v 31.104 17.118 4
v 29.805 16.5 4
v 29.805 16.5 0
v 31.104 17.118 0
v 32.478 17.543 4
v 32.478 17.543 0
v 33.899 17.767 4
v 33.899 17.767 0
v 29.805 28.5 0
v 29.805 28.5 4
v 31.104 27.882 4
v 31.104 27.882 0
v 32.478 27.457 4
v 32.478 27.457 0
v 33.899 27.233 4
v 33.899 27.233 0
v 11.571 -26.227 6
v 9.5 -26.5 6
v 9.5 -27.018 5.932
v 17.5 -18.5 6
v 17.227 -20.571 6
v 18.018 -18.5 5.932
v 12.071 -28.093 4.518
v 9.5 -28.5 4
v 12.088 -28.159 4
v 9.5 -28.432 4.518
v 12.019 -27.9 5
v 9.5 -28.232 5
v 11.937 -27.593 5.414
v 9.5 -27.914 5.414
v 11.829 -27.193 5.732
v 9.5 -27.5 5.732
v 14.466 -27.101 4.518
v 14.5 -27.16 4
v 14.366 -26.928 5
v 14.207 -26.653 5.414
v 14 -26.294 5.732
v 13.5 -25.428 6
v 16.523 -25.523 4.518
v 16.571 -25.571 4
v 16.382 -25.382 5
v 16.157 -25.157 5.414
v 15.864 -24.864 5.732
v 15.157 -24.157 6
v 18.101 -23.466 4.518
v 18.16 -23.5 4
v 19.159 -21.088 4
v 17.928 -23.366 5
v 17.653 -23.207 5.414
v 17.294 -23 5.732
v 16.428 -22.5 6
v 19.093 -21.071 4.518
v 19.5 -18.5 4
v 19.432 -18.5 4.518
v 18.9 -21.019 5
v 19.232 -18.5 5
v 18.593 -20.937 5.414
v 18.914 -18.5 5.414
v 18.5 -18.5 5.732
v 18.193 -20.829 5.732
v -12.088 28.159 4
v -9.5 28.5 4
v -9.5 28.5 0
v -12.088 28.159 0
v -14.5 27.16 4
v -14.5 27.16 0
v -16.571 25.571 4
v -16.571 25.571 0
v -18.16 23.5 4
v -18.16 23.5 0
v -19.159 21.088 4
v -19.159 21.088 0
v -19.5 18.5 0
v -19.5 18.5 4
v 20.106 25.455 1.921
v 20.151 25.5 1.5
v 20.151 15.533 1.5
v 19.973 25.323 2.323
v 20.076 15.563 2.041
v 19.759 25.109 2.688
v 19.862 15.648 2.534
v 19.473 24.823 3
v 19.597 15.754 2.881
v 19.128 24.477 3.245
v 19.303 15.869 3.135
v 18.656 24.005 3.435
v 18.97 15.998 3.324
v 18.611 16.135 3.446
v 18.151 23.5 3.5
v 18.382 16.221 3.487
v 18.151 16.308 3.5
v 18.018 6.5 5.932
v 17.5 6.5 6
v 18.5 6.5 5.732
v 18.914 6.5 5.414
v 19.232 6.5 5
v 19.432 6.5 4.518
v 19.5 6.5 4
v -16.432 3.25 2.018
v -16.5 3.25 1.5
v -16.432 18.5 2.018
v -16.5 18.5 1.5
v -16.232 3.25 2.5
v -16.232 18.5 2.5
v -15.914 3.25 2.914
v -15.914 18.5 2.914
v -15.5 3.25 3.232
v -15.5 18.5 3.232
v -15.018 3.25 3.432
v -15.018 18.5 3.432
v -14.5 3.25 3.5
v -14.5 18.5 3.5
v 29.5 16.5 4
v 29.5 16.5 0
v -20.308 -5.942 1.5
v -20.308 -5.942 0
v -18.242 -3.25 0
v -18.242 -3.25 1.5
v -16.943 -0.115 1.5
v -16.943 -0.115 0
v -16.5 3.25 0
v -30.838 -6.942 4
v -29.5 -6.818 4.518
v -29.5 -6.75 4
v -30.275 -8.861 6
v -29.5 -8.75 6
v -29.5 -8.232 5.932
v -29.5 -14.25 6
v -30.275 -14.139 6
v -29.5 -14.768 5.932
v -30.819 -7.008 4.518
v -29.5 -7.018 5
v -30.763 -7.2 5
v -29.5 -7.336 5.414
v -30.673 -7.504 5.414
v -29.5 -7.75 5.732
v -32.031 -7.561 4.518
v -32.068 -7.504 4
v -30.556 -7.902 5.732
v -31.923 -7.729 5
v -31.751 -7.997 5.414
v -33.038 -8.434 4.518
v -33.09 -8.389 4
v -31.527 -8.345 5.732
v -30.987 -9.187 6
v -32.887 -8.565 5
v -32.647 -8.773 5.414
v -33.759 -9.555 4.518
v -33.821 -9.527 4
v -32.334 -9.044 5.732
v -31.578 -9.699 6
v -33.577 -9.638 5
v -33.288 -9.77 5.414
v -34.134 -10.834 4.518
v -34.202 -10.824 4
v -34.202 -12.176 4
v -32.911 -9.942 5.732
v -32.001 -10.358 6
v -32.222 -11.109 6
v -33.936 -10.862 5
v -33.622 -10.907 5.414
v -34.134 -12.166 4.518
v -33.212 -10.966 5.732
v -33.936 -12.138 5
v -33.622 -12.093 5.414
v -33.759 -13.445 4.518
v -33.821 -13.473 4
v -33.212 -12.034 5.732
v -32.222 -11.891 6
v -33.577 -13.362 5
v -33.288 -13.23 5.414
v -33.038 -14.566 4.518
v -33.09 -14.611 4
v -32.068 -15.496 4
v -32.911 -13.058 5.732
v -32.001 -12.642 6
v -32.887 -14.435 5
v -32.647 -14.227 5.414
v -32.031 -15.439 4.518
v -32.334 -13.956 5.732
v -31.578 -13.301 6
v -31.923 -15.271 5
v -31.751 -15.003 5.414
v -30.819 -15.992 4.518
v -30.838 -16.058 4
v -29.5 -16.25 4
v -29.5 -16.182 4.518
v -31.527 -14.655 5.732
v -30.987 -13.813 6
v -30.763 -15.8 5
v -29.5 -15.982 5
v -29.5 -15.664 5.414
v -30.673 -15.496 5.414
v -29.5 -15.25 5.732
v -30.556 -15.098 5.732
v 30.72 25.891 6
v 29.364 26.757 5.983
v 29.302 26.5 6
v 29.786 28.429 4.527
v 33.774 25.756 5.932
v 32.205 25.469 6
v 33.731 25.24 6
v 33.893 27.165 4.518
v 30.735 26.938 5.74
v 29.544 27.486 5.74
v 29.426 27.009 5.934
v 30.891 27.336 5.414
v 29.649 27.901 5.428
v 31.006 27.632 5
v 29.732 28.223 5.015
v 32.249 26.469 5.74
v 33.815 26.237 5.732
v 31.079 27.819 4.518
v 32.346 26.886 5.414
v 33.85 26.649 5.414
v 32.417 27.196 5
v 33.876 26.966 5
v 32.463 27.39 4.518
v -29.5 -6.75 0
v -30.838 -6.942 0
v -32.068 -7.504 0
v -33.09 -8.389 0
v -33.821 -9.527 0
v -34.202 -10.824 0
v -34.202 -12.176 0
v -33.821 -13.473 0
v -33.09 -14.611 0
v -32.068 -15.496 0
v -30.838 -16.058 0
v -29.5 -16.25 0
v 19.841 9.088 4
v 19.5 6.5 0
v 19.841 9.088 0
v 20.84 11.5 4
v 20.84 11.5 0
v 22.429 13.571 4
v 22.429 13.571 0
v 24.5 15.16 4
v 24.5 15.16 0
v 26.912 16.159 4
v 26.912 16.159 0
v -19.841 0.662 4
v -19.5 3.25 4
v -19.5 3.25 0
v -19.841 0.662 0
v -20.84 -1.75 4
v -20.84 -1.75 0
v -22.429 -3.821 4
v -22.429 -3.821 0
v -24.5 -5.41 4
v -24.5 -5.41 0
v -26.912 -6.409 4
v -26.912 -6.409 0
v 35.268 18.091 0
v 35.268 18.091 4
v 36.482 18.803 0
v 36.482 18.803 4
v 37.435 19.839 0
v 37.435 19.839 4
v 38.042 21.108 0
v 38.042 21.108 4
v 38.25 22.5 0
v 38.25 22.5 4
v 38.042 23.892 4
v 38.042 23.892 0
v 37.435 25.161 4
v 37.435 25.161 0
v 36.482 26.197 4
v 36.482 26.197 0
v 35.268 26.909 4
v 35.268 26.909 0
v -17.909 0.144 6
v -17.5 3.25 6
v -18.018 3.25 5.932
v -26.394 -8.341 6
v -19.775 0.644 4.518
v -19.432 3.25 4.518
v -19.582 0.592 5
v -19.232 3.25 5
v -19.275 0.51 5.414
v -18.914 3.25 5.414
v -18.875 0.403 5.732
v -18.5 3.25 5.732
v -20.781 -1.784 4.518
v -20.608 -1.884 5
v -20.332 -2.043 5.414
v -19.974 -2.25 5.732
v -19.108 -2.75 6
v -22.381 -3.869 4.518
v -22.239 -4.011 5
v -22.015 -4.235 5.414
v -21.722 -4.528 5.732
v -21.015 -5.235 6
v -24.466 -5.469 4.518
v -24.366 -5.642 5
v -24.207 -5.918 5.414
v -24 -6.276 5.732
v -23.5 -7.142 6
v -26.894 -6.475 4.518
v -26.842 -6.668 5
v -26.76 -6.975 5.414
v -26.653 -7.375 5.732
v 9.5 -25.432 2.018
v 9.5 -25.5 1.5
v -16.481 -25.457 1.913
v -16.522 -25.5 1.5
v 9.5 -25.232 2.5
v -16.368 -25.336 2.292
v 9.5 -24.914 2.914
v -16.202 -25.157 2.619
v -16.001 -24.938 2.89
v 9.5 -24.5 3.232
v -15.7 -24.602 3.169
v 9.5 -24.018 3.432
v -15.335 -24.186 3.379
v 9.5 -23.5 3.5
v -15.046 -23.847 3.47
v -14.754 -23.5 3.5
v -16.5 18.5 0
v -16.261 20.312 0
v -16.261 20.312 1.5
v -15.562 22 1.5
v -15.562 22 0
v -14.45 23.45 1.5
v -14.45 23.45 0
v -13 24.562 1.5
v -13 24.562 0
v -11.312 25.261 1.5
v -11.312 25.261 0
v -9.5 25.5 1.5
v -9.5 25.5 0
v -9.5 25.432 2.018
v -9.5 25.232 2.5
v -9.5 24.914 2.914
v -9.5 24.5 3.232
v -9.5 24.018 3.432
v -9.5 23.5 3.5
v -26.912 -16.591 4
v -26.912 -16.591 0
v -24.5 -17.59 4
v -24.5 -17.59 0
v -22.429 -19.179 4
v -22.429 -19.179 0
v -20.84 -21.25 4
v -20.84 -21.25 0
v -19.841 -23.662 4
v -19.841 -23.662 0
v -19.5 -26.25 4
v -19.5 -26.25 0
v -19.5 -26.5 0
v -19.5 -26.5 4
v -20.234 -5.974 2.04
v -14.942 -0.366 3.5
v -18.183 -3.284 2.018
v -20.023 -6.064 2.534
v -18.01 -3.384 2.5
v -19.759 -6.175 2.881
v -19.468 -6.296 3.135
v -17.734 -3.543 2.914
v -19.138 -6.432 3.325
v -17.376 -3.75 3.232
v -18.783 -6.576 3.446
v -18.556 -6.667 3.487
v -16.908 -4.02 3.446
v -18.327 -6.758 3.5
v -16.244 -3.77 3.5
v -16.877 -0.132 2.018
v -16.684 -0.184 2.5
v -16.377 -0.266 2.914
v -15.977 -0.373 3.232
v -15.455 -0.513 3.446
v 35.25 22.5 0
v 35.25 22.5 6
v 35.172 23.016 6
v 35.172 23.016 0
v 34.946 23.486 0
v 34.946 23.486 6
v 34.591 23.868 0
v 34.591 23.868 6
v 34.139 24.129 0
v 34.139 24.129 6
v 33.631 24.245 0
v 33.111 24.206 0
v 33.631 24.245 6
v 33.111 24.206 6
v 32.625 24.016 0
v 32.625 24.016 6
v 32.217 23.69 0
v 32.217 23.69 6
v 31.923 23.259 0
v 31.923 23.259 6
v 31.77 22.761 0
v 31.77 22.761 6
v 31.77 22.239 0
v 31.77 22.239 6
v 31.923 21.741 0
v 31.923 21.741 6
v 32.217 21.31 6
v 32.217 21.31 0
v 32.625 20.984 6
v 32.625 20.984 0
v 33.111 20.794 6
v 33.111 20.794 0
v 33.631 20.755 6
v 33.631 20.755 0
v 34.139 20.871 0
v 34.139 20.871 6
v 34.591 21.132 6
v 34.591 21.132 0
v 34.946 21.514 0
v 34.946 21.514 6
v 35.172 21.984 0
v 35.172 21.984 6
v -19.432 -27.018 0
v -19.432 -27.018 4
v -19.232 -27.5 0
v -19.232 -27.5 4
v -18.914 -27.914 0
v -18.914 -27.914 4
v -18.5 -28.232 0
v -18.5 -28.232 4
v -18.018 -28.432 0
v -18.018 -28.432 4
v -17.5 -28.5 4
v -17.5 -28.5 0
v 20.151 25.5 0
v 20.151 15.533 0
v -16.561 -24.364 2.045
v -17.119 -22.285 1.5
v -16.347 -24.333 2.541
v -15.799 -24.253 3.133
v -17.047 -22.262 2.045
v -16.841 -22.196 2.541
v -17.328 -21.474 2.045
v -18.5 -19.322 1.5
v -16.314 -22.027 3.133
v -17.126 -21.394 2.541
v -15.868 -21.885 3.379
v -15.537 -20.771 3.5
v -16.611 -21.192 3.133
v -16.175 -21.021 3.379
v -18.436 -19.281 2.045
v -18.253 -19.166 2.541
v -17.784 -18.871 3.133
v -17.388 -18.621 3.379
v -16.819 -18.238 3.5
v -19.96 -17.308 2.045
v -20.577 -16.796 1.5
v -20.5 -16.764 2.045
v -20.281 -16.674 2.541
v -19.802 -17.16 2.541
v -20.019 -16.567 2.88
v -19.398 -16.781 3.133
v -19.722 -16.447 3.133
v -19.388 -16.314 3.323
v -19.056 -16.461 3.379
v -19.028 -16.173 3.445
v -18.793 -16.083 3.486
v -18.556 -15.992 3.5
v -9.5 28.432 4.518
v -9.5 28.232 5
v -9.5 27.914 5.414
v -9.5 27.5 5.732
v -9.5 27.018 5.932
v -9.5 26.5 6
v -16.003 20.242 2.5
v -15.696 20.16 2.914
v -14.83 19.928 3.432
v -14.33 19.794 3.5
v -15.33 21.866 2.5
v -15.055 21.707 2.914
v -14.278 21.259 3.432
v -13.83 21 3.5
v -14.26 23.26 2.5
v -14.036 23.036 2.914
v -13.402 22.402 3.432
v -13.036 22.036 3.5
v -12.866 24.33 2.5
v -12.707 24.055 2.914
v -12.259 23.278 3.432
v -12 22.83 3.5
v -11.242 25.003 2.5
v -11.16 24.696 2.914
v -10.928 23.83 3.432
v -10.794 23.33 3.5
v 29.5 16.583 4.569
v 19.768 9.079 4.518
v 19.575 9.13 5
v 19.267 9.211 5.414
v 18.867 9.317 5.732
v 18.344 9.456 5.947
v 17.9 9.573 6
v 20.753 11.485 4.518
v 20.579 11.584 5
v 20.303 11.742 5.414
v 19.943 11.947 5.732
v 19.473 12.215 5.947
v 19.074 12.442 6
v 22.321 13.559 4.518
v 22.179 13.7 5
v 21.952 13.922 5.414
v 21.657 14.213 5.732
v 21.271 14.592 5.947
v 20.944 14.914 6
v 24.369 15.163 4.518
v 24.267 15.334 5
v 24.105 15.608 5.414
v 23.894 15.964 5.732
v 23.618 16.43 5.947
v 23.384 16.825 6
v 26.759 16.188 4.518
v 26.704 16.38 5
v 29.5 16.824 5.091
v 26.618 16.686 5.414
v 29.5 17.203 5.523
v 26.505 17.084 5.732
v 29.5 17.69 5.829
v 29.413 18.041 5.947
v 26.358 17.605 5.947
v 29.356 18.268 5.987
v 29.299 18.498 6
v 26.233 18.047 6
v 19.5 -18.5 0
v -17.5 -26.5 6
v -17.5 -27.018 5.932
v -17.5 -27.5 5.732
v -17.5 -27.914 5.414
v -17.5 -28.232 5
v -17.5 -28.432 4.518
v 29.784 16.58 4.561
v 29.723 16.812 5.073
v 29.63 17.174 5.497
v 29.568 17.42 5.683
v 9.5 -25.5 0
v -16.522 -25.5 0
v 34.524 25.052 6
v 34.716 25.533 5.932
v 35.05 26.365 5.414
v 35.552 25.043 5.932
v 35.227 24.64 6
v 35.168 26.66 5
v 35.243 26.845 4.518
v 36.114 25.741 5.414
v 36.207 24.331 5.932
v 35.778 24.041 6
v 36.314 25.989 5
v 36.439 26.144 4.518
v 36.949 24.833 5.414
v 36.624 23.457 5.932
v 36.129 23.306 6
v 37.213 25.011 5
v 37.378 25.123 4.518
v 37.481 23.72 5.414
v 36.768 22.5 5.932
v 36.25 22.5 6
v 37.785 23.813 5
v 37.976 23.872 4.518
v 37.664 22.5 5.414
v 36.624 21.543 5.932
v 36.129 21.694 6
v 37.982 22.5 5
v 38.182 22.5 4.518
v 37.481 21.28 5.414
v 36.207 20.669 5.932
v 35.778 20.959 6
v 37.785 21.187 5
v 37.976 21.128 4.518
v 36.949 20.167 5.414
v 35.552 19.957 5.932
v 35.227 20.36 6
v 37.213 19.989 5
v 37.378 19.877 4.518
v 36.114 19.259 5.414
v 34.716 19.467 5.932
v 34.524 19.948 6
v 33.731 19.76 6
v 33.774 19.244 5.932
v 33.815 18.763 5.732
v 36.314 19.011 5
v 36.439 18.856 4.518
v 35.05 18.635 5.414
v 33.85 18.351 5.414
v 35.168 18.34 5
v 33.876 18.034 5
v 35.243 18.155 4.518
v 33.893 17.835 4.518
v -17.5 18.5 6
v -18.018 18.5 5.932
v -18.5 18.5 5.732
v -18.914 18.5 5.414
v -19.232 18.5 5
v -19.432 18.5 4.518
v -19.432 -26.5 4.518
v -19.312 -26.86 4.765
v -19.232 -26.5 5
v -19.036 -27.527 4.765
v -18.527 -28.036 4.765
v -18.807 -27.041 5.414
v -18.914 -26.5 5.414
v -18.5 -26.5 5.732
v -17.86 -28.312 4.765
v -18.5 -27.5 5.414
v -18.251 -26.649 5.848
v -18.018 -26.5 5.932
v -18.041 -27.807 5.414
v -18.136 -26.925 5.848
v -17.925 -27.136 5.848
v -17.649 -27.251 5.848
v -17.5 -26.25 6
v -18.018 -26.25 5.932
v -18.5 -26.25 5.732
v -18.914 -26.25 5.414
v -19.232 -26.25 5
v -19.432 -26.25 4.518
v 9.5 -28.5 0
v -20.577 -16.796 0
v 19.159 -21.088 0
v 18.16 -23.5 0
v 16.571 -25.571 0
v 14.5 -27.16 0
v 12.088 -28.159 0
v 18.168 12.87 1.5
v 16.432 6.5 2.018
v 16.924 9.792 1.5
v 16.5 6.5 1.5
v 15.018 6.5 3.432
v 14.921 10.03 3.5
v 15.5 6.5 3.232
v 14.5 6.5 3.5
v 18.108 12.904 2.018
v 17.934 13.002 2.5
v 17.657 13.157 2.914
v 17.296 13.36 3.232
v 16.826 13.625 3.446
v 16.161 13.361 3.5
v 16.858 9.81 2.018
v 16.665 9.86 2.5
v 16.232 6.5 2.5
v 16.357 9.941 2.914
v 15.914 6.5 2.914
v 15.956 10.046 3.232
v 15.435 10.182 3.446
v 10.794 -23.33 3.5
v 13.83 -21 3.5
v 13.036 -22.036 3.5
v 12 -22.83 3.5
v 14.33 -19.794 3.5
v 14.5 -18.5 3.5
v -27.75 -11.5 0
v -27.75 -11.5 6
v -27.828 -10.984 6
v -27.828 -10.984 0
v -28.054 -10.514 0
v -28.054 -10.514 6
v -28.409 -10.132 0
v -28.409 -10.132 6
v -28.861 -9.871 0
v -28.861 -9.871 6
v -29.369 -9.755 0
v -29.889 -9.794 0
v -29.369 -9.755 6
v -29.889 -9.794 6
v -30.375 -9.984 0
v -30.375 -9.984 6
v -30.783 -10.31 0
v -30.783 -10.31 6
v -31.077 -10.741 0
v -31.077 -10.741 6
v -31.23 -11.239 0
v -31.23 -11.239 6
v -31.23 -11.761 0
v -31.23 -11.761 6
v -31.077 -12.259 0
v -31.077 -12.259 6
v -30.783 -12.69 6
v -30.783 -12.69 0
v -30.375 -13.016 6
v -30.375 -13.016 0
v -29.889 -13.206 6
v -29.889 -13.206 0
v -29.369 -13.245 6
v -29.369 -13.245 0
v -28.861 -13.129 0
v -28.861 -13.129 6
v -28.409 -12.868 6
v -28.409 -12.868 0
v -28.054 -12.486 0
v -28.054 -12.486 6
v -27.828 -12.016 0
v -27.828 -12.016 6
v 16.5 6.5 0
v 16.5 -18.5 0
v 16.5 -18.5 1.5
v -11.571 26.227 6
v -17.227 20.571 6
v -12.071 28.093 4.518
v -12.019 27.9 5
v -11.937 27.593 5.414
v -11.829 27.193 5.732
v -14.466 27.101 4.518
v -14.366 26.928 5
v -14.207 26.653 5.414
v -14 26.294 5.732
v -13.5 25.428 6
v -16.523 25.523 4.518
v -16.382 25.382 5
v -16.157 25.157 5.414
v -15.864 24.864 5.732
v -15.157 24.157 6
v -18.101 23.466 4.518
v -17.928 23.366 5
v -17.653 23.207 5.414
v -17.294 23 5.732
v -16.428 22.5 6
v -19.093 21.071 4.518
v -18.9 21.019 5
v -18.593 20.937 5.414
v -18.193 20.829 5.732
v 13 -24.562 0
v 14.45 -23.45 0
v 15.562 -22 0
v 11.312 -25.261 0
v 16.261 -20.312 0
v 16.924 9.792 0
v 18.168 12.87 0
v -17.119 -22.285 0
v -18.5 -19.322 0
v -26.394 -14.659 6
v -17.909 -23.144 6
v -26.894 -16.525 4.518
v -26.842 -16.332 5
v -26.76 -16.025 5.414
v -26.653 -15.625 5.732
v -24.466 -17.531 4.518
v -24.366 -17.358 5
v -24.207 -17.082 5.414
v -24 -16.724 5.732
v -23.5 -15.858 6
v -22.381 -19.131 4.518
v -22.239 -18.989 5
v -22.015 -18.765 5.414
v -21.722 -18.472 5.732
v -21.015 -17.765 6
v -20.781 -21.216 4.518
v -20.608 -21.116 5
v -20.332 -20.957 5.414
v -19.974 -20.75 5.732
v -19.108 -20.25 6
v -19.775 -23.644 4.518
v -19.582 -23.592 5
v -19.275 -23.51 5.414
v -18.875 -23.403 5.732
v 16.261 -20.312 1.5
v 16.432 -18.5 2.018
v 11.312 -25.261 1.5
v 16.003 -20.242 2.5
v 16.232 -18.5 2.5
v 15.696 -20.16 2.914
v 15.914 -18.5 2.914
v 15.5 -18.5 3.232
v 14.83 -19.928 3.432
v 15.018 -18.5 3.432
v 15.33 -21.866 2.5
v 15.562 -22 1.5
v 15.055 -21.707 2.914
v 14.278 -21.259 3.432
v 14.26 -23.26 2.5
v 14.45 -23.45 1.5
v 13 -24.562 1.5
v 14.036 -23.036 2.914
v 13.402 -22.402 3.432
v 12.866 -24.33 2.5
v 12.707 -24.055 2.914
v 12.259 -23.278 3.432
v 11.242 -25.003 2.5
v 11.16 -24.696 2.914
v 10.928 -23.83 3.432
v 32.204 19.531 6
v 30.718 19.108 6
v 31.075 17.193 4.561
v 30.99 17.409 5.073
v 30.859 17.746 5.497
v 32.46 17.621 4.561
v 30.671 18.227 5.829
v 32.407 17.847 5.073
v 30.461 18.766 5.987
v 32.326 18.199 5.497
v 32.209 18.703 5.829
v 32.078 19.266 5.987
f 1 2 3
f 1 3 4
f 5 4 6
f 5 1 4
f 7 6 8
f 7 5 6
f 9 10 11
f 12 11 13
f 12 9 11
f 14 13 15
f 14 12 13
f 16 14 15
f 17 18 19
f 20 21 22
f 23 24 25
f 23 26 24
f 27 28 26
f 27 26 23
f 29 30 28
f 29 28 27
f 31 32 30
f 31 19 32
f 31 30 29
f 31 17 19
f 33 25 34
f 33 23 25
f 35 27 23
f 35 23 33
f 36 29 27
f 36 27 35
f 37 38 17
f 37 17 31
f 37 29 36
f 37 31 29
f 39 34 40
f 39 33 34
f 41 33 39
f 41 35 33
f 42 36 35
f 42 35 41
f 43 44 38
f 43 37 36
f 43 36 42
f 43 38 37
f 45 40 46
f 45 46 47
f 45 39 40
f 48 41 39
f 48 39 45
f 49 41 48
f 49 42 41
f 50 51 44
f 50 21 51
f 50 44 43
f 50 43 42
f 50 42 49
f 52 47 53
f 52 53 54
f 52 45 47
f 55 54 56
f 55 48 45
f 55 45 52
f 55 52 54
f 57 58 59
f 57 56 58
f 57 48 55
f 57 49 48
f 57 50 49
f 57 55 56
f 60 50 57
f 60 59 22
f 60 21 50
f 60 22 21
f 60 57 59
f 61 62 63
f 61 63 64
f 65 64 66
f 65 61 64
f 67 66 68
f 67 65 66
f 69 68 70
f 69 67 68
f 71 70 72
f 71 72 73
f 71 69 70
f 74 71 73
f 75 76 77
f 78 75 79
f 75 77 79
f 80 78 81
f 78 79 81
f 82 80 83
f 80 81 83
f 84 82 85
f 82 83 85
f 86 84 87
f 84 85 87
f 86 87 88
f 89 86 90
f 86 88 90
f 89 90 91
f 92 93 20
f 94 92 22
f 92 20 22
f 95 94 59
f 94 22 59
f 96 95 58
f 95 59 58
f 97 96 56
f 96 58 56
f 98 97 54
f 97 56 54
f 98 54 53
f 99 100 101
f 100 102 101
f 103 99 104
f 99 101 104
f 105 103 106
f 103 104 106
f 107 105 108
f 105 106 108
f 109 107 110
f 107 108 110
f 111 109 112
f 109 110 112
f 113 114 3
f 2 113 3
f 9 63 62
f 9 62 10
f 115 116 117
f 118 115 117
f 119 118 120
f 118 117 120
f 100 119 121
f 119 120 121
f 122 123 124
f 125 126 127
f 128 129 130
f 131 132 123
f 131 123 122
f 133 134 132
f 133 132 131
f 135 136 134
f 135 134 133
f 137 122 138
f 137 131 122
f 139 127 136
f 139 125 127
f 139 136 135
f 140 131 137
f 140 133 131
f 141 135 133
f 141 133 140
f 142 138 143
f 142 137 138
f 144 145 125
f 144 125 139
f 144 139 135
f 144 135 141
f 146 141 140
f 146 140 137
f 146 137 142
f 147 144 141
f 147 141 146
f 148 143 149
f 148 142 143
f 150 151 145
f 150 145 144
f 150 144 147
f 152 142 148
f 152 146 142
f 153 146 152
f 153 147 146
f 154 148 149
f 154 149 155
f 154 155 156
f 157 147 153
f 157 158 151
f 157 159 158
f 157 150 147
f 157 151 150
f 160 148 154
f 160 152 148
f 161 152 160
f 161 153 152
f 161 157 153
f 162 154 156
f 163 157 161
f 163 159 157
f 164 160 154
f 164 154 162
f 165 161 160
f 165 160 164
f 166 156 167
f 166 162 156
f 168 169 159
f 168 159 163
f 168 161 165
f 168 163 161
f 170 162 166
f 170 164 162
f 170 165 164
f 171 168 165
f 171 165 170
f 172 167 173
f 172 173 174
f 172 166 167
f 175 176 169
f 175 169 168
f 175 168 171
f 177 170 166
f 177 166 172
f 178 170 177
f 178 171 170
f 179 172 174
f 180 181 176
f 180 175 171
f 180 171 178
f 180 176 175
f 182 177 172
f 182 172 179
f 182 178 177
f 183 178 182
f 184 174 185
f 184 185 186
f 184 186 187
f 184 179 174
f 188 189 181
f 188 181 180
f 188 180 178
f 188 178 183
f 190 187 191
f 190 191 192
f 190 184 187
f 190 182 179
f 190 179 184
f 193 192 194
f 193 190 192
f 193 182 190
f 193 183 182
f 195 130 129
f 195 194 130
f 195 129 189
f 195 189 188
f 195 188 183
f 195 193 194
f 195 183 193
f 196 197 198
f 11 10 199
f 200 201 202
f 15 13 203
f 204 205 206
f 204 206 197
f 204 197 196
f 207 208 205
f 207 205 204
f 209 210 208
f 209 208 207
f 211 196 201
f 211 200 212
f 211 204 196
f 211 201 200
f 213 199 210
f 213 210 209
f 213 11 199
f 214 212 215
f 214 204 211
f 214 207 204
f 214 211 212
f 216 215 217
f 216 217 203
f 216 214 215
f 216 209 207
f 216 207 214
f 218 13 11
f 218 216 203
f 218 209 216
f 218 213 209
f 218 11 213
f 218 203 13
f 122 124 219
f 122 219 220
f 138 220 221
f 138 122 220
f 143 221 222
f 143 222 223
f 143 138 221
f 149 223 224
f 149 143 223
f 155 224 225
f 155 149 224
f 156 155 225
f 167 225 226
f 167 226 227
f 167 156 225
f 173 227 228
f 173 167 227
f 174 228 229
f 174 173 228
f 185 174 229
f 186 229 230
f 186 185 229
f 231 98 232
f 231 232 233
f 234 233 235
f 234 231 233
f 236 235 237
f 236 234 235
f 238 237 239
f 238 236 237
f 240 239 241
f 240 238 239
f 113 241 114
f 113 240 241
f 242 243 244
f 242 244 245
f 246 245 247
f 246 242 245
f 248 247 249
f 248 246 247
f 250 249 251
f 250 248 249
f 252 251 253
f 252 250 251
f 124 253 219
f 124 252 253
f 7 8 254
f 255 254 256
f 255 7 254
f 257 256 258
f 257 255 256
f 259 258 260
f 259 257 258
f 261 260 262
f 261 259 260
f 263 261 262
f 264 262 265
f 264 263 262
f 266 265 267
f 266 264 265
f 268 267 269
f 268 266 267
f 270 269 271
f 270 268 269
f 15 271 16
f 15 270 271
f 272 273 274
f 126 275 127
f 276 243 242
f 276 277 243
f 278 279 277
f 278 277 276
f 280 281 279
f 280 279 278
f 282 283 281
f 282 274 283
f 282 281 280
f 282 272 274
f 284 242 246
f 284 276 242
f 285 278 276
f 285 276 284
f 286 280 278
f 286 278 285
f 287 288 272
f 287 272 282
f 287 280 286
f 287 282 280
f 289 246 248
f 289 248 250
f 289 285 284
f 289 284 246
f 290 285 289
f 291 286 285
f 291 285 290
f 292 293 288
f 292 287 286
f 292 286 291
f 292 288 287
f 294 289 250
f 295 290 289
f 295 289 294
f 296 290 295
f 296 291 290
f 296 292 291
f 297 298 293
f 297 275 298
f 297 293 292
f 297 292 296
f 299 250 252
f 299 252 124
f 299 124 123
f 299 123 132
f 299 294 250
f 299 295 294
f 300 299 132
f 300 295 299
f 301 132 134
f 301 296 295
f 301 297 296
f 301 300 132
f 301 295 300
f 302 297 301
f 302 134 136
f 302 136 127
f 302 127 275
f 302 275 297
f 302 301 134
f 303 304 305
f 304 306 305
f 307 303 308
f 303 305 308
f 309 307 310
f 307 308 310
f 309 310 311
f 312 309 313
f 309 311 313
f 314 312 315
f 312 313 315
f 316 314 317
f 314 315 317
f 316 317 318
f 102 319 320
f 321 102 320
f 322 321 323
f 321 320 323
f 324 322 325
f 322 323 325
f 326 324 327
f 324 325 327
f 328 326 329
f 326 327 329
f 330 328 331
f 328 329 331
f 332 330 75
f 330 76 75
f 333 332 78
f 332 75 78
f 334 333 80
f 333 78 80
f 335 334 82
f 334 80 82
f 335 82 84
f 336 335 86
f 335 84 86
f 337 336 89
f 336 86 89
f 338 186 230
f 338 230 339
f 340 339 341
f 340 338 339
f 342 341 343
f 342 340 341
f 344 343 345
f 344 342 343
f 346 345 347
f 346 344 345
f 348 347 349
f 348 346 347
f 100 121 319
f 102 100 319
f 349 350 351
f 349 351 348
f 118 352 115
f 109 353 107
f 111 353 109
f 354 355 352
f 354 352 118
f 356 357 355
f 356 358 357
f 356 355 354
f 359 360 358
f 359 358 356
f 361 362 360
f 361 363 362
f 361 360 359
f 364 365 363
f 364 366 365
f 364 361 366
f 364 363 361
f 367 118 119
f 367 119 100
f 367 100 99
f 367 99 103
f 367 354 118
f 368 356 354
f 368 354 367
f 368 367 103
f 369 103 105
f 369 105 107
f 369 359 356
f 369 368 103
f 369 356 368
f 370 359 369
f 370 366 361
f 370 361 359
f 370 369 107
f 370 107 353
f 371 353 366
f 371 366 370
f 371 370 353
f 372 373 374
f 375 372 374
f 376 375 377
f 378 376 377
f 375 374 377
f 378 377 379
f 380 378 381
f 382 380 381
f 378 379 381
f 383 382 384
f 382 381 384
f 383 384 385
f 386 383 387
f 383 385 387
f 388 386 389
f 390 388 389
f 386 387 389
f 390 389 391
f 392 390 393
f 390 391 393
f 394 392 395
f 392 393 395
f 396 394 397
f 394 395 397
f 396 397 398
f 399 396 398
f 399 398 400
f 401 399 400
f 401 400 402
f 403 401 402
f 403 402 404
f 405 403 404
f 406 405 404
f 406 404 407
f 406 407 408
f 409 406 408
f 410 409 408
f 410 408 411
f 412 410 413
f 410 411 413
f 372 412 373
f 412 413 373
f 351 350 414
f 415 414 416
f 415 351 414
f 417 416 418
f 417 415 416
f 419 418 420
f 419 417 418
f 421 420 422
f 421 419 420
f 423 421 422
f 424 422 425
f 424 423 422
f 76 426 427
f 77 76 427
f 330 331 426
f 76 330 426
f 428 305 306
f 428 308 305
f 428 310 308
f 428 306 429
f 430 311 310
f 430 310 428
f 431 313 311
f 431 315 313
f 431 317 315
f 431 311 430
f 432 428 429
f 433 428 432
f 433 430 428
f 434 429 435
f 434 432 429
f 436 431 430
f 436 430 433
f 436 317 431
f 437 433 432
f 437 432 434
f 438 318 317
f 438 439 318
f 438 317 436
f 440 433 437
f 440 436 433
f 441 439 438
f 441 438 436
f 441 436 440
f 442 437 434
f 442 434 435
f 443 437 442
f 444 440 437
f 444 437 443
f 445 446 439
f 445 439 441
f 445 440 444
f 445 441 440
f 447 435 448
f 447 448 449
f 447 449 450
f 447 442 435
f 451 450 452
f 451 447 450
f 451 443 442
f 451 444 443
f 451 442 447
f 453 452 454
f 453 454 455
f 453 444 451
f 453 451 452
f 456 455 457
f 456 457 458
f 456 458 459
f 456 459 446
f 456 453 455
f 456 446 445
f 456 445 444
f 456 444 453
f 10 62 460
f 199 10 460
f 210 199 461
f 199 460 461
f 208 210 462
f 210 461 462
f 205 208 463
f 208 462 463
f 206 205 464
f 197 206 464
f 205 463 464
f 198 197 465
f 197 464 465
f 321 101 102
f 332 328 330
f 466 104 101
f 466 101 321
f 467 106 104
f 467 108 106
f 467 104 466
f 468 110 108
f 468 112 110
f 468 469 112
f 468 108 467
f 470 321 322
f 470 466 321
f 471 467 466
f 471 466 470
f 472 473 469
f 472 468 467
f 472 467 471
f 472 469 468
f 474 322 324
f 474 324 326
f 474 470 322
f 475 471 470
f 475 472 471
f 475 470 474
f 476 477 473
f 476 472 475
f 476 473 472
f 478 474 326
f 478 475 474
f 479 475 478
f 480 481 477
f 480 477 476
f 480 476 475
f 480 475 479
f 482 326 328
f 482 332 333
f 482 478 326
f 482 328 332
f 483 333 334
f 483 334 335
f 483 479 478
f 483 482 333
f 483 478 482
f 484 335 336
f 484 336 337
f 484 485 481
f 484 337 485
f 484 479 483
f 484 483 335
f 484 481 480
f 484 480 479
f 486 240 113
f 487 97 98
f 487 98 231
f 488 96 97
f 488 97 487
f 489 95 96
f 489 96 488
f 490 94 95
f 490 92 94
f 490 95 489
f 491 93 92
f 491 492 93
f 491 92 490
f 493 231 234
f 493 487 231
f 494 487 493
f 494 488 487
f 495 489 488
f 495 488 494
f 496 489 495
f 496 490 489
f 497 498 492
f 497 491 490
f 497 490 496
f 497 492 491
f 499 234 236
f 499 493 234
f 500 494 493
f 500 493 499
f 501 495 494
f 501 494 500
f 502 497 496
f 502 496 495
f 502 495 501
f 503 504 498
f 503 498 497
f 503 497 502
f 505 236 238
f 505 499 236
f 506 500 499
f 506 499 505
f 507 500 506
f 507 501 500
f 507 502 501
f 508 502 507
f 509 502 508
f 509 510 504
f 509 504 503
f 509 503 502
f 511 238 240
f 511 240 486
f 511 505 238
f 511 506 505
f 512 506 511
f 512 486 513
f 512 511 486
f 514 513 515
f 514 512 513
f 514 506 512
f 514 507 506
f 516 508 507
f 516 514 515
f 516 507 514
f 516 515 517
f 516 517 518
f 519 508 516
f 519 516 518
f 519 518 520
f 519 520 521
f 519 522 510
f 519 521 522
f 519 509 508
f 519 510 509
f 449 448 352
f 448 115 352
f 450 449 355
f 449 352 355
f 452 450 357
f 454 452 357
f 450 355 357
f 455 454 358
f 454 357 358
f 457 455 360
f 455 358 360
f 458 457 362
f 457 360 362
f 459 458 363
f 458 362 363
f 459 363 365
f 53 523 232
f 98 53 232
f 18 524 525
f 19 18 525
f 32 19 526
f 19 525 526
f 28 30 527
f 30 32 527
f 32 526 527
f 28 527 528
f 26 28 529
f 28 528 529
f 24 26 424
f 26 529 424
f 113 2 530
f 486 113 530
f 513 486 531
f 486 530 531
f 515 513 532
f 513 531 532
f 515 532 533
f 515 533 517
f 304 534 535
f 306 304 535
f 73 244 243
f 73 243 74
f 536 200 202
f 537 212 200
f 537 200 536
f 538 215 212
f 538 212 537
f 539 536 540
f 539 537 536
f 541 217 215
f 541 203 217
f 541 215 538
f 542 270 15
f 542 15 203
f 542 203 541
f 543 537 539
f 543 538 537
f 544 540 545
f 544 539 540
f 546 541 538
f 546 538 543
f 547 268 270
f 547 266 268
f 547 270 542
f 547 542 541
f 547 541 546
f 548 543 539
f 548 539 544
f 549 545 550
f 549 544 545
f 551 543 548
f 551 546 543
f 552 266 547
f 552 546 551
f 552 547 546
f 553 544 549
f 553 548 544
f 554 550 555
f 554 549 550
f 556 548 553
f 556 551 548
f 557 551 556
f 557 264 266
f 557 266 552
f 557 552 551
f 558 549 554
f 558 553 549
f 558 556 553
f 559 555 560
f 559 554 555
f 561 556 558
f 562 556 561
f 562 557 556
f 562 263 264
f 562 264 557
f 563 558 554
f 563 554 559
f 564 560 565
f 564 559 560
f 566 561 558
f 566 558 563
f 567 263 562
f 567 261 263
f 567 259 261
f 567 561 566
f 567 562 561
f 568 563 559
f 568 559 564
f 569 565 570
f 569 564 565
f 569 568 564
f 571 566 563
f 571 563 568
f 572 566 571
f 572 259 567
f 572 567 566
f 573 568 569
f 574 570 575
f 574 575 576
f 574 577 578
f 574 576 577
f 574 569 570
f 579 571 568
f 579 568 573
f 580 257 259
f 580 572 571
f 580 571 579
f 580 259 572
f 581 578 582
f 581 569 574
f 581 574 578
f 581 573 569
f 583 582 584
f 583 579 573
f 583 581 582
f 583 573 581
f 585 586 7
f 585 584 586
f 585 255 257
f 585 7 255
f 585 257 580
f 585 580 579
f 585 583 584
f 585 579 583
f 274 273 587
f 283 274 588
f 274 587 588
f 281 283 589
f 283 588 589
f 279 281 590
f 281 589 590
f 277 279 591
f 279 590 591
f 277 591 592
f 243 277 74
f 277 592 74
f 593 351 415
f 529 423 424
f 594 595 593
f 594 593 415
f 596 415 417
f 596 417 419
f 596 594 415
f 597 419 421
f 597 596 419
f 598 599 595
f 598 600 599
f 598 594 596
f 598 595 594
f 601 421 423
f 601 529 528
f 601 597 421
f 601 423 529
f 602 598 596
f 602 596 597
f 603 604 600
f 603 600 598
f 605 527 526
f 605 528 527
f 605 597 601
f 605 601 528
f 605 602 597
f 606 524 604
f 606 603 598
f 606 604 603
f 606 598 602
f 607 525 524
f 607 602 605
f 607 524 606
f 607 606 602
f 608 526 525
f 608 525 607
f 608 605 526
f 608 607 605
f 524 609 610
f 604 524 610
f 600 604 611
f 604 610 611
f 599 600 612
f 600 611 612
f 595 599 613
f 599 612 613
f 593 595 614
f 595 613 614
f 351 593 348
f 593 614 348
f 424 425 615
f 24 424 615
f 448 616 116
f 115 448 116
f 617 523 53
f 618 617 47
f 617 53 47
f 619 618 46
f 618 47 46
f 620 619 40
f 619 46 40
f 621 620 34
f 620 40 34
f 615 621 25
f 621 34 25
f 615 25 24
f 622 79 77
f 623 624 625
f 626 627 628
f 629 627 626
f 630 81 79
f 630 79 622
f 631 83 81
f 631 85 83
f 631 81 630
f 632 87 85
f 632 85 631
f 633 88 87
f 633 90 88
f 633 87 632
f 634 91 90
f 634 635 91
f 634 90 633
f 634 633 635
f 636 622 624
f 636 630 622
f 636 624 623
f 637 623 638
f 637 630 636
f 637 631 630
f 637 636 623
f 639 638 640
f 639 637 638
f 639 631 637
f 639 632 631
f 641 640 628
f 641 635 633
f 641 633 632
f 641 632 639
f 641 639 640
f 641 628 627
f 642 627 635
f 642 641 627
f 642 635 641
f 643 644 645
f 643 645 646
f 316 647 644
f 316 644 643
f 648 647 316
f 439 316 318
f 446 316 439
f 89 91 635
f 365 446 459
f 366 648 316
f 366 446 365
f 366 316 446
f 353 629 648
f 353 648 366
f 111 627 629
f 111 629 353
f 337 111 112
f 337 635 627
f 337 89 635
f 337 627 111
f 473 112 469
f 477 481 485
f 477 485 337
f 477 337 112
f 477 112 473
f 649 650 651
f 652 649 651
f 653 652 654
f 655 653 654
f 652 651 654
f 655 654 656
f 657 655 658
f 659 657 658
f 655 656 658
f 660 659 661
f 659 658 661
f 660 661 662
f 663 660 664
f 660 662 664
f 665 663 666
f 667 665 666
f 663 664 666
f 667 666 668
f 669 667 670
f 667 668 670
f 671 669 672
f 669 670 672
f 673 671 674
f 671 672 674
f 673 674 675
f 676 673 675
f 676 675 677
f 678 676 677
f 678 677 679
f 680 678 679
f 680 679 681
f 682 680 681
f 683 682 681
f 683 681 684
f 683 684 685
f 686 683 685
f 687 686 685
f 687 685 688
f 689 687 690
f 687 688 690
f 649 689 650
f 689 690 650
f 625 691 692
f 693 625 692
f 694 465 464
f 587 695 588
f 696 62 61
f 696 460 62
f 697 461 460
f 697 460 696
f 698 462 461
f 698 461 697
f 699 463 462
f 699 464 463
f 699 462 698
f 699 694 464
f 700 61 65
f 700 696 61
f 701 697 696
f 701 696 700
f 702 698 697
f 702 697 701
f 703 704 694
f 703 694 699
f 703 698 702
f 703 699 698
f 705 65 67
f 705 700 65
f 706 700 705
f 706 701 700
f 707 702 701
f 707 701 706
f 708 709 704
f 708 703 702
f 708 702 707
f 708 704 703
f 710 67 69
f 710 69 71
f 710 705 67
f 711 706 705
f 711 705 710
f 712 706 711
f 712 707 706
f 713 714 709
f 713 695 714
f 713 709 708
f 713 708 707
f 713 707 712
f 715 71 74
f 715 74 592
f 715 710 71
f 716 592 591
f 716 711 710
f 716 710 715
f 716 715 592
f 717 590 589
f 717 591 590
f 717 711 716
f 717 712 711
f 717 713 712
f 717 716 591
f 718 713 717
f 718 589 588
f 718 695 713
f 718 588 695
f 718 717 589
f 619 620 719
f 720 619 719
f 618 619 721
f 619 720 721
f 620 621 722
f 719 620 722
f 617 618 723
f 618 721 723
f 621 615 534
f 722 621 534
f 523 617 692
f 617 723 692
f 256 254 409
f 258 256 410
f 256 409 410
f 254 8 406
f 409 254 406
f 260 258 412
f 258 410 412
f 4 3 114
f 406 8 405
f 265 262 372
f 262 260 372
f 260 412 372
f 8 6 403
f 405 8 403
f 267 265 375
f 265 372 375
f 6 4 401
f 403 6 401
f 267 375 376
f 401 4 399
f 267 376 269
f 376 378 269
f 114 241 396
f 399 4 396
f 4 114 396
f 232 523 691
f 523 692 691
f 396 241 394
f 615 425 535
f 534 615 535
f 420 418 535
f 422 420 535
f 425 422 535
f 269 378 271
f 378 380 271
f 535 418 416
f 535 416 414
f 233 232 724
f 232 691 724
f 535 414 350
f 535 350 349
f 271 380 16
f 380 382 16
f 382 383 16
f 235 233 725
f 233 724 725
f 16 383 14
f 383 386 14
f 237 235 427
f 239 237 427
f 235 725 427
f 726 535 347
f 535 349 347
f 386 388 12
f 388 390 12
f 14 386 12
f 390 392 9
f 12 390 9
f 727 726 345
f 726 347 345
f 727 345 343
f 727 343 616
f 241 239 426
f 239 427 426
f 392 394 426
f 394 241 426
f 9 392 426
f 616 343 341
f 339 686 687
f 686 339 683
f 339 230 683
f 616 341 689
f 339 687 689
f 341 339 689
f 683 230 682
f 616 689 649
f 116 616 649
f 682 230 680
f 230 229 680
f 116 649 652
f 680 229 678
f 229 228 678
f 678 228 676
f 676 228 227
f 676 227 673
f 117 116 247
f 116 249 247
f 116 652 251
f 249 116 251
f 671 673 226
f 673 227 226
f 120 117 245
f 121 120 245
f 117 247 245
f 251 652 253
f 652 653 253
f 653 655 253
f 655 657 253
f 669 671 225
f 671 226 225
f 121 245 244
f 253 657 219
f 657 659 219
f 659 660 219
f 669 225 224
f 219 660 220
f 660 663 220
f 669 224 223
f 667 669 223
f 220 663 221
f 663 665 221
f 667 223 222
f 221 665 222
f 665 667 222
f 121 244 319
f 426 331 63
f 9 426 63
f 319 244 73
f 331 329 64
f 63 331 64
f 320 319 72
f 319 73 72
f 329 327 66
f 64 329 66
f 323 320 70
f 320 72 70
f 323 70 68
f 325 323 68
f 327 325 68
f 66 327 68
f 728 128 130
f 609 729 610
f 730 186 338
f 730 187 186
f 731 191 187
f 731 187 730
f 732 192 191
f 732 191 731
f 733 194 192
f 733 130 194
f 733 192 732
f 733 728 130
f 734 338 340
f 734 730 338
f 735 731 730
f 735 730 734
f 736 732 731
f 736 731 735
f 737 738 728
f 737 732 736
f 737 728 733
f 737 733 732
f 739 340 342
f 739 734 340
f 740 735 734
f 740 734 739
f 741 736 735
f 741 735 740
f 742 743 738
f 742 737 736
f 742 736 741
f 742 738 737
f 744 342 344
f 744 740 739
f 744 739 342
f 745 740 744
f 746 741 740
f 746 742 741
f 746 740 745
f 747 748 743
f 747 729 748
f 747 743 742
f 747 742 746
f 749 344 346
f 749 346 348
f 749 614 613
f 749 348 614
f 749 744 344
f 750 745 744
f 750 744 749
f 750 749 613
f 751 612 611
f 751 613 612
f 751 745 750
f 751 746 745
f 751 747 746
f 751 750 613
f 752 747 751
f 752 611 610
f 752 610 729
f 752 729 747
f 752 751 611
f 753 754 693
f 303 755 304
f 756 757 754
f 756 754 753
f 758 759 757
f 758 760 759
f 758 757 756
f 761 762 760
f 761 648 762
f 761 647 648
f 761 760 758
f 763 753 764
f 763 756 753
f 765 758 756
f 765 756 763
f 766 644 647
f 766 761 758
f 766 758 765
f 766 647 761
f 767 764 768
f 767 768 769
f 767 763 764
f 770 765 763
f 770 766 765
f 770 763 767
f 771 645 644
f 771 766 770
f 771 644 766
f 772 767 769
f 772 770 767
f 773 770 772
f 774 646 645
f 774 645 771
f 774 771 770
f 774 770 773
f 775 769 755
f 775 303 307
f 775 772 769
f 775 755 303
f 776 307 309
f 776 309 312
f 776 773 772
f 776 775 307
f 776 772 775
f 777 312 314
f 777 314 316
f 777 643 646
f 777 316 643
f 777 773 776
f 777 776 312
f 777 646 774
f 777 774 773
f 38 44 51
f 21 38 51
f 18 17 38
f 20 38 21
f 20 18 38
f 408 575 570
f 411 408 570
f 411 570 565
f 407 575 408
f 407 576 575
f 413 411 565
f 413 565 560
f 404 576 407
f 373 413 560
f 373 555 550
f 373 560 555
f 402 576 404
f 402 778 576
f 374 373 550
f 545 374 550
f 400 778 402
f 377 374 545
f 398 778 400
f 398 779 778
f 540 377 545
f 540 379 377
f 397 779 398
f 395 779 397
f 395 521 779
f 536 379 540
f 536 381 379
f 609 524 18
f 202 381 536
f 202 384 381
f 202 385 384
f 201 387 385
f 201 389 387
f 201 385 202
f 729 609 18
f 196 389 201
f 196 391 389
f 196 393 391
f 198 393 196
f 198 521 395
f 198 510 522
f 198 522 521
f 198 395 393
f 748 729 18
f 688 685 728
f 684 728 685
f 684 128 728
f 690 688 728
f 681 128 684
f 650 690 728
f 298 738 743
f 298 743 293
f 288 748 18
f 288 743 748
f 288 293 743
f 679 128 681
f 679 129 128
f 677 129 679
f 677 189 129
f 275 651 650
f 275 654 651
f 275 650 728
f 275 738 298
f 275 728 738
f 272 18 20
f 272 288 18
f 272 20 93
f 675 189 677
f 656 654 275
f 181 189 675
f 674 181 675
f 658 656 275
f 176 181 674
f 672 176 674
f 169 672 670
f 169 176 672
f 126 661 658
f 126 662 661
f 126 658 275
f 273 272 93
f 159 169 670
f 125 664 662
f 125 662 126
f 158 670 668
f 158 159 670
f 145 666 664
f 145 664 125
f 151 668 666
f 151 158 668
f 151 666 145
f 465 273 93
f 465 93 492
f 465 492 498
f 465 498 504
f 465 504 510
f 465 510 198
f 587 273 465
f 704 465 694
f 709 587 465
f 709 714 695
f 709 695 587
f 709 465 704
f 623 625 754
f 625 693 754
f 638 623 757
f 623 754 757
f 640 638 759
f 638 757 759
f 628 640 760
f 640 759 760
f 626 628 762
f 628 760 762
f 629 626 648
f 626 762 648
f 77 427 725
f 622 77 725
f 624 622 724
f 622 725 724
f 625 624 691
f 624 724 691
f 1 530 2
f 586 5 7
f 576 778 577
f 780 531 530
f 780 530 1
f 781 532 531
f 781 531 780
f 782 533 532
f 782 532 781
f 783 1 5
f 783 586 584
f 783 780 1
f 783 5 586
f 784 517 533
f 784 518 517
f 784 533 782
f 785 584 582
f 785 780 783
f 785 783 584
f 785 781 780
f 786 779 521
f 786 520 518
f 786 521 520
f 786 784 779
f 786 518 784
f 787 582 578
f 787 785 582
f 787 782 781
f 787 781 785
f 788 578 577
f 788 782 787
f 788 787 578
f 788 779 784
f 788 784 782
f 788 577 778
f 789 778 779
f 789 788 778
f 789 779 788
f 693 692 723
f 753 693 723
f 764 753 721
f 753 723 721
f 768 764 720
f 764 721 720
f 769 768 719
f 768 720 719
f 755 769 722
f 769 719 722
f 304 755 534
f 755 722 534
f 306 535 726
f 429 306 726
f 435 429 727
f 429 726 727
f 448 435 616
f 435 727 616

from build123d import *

# Parameters (mm, degrees)
SKETCH1_W           = 39
SKETCH1_H           = 57
BOSS_EXTRUDE1_DEPTH = 6
SKETCH2_R           = 4.75
SKETCH2_R_2         = 1.75
BOSS_EXTRUDE2_DEPTH = 6
FILLET4_R           = 10
SKETCH4_W           = 10.304705379
SKETCH4_H           = 12
BOSS_EXTRUDE3_DEPTH = 6
FILLET5_R           = 10
CUT_EXTRUDE2_DEPTH  = 3.5
FILLET7_R           = 2
FILLET8_R           = 2
FILLET9_R           = 2


with BuildPart() as part:
    # Sketch1 → Boss-Extrude1 (new body)
    with BuildSketch(Plane.XY):
        Rectangle(SKETCH1_W, SKETCH1_H)
    extrude(amount=BOSS_EXTRUDE1_DEPTH)

    # Sketch2 → Boss-Extrude2 (add)
    # profile 1 of 4: a face of its own
    with BuildSketch(Plane.XY.offset(6)):
        with BuildLine():
            ThreePointArc((33.5, 17.75), (28.75, 22.5), (33.5, 27.25))
            Line((33.5, 27.25), (19.5, 27.25))
            Line((19.5, 27.25), (19.5, 17.75))
            Line((19.5, 17.75), (33.5, 17.75))
        make_face()
    # profile 2 of 4: a face of its own
    with BuildSketch(Plane.XY.offset(6)):
        with BuildLine():
            Line((-19.5, -6.75), (-29.5, -6.75))
            ThreePointArc((-29.5, -6.75), (-26.141242789, -8.141242789), (-24.75, -11.5))
            ThreePointArc((-24.75, -11.5), (-26.141242789, -14.858757211), (-29.5, -16.25))
            Line((-29.5, -16.25), (-19.5, -16.25))
            Line((-19.5, -16.25), (-19.5, -6.75))
        make_face()
    # profile 3 of 4: a face of its own
    with BuildSketch(Plane.XY.offset(6)):
        with Locations((-29.5, -11.5)):
            Circle(SKETCH2_R)
        with Locations((-29.5, -11.5)):
            Circle(SKETCH2_R_2, mode=Mode.SUBTRACT)
    # profile 4 of 4: a face of its own
    with BuildSketch(Plane.XY.offset(6)):
        with Locations((33.5, 22.5)):
            Circle(SKETCH2_R)
        with Locations((33.5, 22.5)):
            Circle(SKETCH2_R_2, mode=Mode.SUBTRACT)
    extrude(amount=-BOSS_EXTRUDE2_DEPTH)

    # Fillet4
    fillet4_edges = [part.edges().sort_by_distance(p)[0] for p in [
        (-19.5, 28.5, 3),
        (19.5, -28.5, 3),
    ]]
    fillet(fillet4_edges, radius=FILLET4_R)

    # Sketch4 → Boss-Extrude3 (add)
    with BuildSketch(Plane.XY.offset(6)):
        with Locations((24.652352689, 22.5)):
            Rectangle(SKETCH4_W, SKETCH4_H)
    extrude(amount=-BOSS_EXTRUDE3_DEPTH)

    # Fillet5
    # the kernel refuses this fillet: 10 mm, written as the material it adds along each edge
    with BuildSketch(Plane(origin=(29.804705379, 17.75, 6), x_dir=(0, -1, 0), z_dir=(0, 0, -1))) as fillet5_piece_1:
        with BuildLine():
            CenterArc((9.947871925, -4.934270359), FILLET5_R, 150.433919307, 24.747651836)
            Line((-0.016787007, -4.094286808), (-1.0132529, -4.010288453))
            ThreePointArc((-1.0132529, -4.010288453), (-1, -3.695294621), (-1, 0))
            Line((-1, 0), (0, 1))
            ThreePointArc((0, 1), (0.625, 1), (0.380212808, 0.493427036))
            Line((0.380212808, 0.493427036), (1.25, 0))
        make_face()
    extrude(amount=6)
    with BuildSketch(Plane(origin=(29.804705379, 27.25, 0), x_dir=(0.9999915946740242, -0.004100070889875189, 0), z_dir=(0, 0, 1))) as fillet5_piece_2:
        with BuildLine():
            CenterArc((4.893441905, 9.968019168), FILLET5_R, 240.668836723, 24.747651836)
            Line((-0.005125089, 1.249989493), (-0.494981788, 0.378186526))
            ThreePointArc((-0.494981788, 0.378186526), (-1.002554139, 0.620894676), (-0.999991595, -0.004100071))
            Line((-0.999991595, -0.004100071), (0.004100071, -0.999991595))
            ThreePointArc((0.004100071, -0.999991595), (3.699363631, -0.984840625), (4.014409153, -0.996801917))
            Line((4.014409153, -0.996801917), (4.094321222, 0))
        make_face()
    extrude(amount=6)
    with BuildSketch(Plane(origin=(19.5, 16.5, 6), x_dir=(0, -1, 0), z_dir=(0, 0, -1)), Plane(origin=(-19.5, -6.75, 6), x_dir=(0, 1, 0), z_dir=(0, 0, -1)), Plane(origin=(-19.5, -16.25, 6), x_dir=(-1, 0, 0), z_dir=(0, 0, -1))) as fillet5_piece_3:
        with BuildLine():
            CenterArc((FILLET5_R, -FILLET5_R), FILLET5_R, 90, 90)
            Line((0, -FILLET5_R), (-FILLET5_R * 0.02, -FILLET5_R))
            Line((-FILLET5_R * 0.02, -FILLET5_R), (-FILLET5_R * 0.02, FILLET5_R * 0.02))
            Line((-FILLET5_R * 0.02, FILLET5_R * 0.02), (FILLET5_R, FILLET5_R * 0.02))
            Line((FILLET5_R, FILLET5_R * 0.02), (FILLET5_R, 0))
        make_face()
    extrude(amount=6)

    # Sketch5 → Cut-Extrude2 (cut)
    with BuildSketch(Plane(origin=(0, 0, 0), x_dir=(-1, 0, 0), z_dir=(0, 0, -1))):
        with BuildLine():
            Line((16.5, 3.25), (16.5, 18.5))
            ThreePointArc((16.5, 18.5), (14.449747468, 23.449747468), (9.5, 25.5))
            Line((9.5, 25.5), (-20.150604469, 25.5))
            Line((-20.150604469, 25.5), (-20.150604469, 15.532652058))
            ThreePointArc((-20.150604469, 15.532652058), (-17.447155068, 11.371234859), (-16.5, 6.5))
            Line((-16.5, 6.5), (-16.5, -18.5))
            ThreePointArc((-16.5, -18.5), (-14.449747468, -23.449747468), (-9.5, -25.5))
            Line((-9.5, -25.5), (16.521652648, -25.5))
            ThreePointArc((16.521652648, -25.5), (17.716131688, -20.759968343), (20.576715851, -16.796164799))
            Line((20.576715851, -16.796164799), (20.307611845, -5.942388155))
            ThreePointArc((20.307611845, -5.942388155), (17.489566077, -1.724884621), (16.5, 3.25))
        make_face()
    extrude(amount=-CUT_EXTRUDE2_DEPTH, mode=Mode.SUBTRACT)

    # Fillet7
    fillet7_edges = [part.edges().sort_by_distance(p)[0] for p in [
        (-19.5, -28.5, 3),
    ]]
    fillet(fillet7_edges, radius=FILLET7_R)

    # Fillet8
    # the kernel refuses this fillet: 2 mm, written as the material it takes off along each edge
    with BuildSketch(Plane(origin=(34.738975739, 7.802128075, 6), x_dir=(-0.8500291529283407, 0.5267356444858536, 0), z_dir=(-0.5267356444858536, -0.8500291529283407, 0))) as fillet8_piece_1:
        with BuildLine():
            CenterArc((10 + FILLET8_R, FILLET8_R), FILLET8_R, 180, 90)
            Line((10, FILLET8_R), (10, 0))
            Line((10, 0), (10 + FILLET8_R, 0))
        make_face()
    revolve(axis=Axis((34.738975739, 7.802128075, 6), (0, 0, -1)), revolution_arc=53.396411501, mode=Mode.SUBTRACT)
    with BuildSketch(Plane(origin=(34.738975739, 37.197871925, 6), x_dir=(-0.8500291529284019, -0.5267356444857548, 0), z_dir=(-0.5267356444857548, 0.8500291529284019, 0))) as fillet8_piece_2:
        with BuildLine():
            CenterArc((10 + FILLET8_R, -FILLET8_R), FILLET8_R, 90, 90)
            Line((10, -FILLET8_R), (10, 0))
            Line((10, 0), (10 + FILLET8_R, 0))
        make_face()
    revolve(axis=Axis((34.738975739, 37.197871925, 6), (0, 0, 1)), revolution_arc=53.396411501, mode=Mode.SUBTRACT)
    with BuildSketch(Plane(origin=(29.5, 6.5, 6), x_dir=(-1, 0, 0), z_dir=(0, -1, 0))) as fillet8_piece_3:
        with BuildLine():
            CenterArc((10 + FILLET8_R, FILLET8_R), FILLET8_R, 180, 90)
            Line((10, FILLET8_R), (10, 0))
            Line((10, 0), (10 + FILLET8_R, 0))
        make_face()
    revolve(axis=Axis((29.5, 6.5, 6), (0, 0, -1)), revolution_arc=90, mode=Mode.SUBTRACT)
    with BuildSketch(Plane(origin=(19.5, -18.5, 6), x_dir=(-1, 0, 0), z_dir=(0, 1, 0))) as fillet8_piece_4:
        with BuildLine():
            CenterArc((FILLET8_R, -FILLET8_R), FILLET8_R, 90, 90)
            Line((0, -FILLET8_R), (0, 0))
            Line((0, 0), (FILLET8_R, 0))
        make_face()
    extrude(amount=25, mode=Mode.SUBTRACT)
    with BuildSketch(Plane(origin=(9.5, -18.5, 6), x_dir=(0, -1, 0), z_dir=(-1, 0, 0))) as fillet8_piece_5:
        with BuildLine():
            CenterArc((10 - FILLET8_R, -FILLET8_R), FILLET8_R, 0, 90)
            Line((10, -FILLET8_R), (10, 0))
            Line((10, 0), (10 - FILLET8_R, 0))
        make_face()
    revolve(axis=Axis((9.5, -18.5, 6), (0, 0, 1)), revolution_arc=90, mode=Mode.SUBTRACT)
    with BuildSketch(Plane(origin=(-17.5, -28.5, 6), x_dir=(0, 1, 0), z_dir=(1, 0, 0))) as fillet8_piece_6:
        with BuildLine():
            CenterArc((FILLET8_R, -FILLET8_R), FILLET8_R, 90, 90)
            Line((0, -FILLET8_R), (0, 0))
            Line((0, 0), (FILLET8_R, 0))
        make_face()
    extrude(amount=27, mode=Mode.SUBTRACT)
    with BuildSketch(Plane(origin=(-17.5, -26.5, 6), x_dir=(-1, 0, 0), z_dir=(0, 1, 0))) as fillet8_piece_7:
        with BuildLine():
            CenterArc((2 - FILLET8_R, -FILLET8_R), FILLET8_R, 0, 90)
            Line((2, -FILLET8_R), (2, 0))
            Line((2, 0), (2 - FILLET8_R, 0))
        make_face()
    revolve(axis=Axis((-17.5, -26.5, 6), (0, 0, 1)), revolution_arc=90, mode=Mode.SUBTRACT)
    with BuildSketch(Plane(origin=(-19.5, -26.25, 6), x_dir=(1, 0, 0), z_dir=(0, -1, 0))) as fillet8_piece_8:
        with BuildLine():
            CenterArc((FILLET8_R, -FILLET8_R), FILLET8_R, 90, 90)
            Line((0, -FILLET8_R), (0, 0))
            Line((0, 0), (FILLET8_R, 0))
        make_face()
    extrude(amount=0.25, mode=Mode.SUBTRACT)
    with BuildSketch(Plane(origin=(-29.5, -26.25, 6), x_dir=(0, 1, 0), z_dir=(-1, 0, 0))) as fillet8_piece_9:
        with BuildLine():
            CenterArc((10 + FILLET8_R, FILLET8_R), FILLET8_R, 180, 90)
            Line((10, FILLET8_R), (10, 0))
            Line((10, 0), (10 + FILLET8_R, 0))
        make_face()
    revolve(axis=Axis((-29.5, -26.25, 6), (0, 0, -1)), revolution_arc=90, mode=Mode.SUBTRACT)
    with BuildSketch(Plane(origin=(-29.5, -11.5, 6), x_dir=(0, 1, 0), z_dir=(1, 0, 0))) as fillet8_piece_10:
        with BuildLine():
            CenterArc((4.75 - FILLET8_R, -FILLET8_R), FILLET8_R, 0, 90)
            Line((4.75, -FILLET8_R), (4.75, 0))
            Line((4.75, 0), (4.75 - FILLET8_R, 0))
        make_face()
    revolve(axis=Axis((-29.5, -11.5, 6), (0, 0, 1)), revolution_arc=180, mode=Mode.SUBTRACT)
    with BuildSketch(Plane(origin=(-29.5, 3.25, 6), x_dir=(1, 0, 0), z_dir=(0, 1, 0))) as fillet8_piece_11:
        with BuildLine():
            CenterArc((10 + FILLET8_R, FILLET8_R), FILLET8_R, 180, 90)
            Line((10, FILLET8_R), (10, 0))
            Line((10, 0), (10 + FILLET8_R, 0))
        make_face()
    revolve(axis=Axis((-29.5, 3.25, 6), (0, 0, -1)), revolution_arc=90, mode=Mode.SUBTRACT)
    with BuildSketch(Plane(origin=(-19.5, 18.5, 6), x_dir=(1, 0, 0), z_dir=(0, -1, 0))) as fillet8_piece_12:
        with BuildLine():
            CenterArc((FILLET8_R, -FILLET8_R), FILLET8_R, 90, 90)
            Line((0, -FILLET8_R), (0, 0))
            Line((0, 0), (FILLET8_R, 0))
        make_face()
    extrude(amount=15.25, mode=Mode.SUBTRACT)
    with BuildSketch(Plane(origin=(-9.5, 18.5, 6), x_dir=(0, 1, 0), z_dir=(1, 0, 0))) as fillet8_piece_13:
        with BuildLine():
            CenterArc((10 - FILLET8_R, -FILLET8_R), FILLET8_R, 0, 90)
            Line((10, -FILLET8_R), (10, 0))
            Line((10, 0), (10 - FILLET8_R, 0))
        make_face()
    revolve(axis=Axis((-9.5, 18.5, 6), (0, 0, 1)), revolution_arc=90, mode=Mode.SUBTRACT)
    with BuildSketch(Plane(origin=(33.5, 22.5, 6), x_dir=(0.08399835516458835, 0.9964658932094184, 0), z_dir=(-0.9964658932094184, 0.08399835516458835, 0))) as fillet8_piece_14:
        with BuildLine():
            CenterArc((4.75 - FILLET8_R, FILLET8_R), FILLET8_R, 270, 90)
            Line((4.75, FILLET8_R), (4.75, 0))
            Line((4.75, 0), (4.75 - FILLET8_R, 0))
        make_face()
    revolve(axis=Axis((33.5, 22.5, 6), (0, 0, -1)), revolution_arc=170.363142288, mode=Mode.SUBTRACT)
    with BuildSketch(Plane(origin=(-9.5, 28.5, 6), x_dir=(0, -1, 0), z_dir=(1, 0, 0))) as fillet8_piece_15:
        with BuildLine():
            CenterArc((FILLET8_R, FILLET8_R), FILLET8_R, 180, 90)
            Line((0, FILLET8_R), (0, 0))
            Line((0, 0), (FILLET8_R, 0))
        make_face()
    extrude(amount=44.304705379, mode=Mode.SUBTRACT)
    with BuildSketch(Plane(origin=(34.804705379, 16.5, 6), x_dir=(0, 1, 0), z_dir=(-1, 0, 0))) as fillet8_piece_16:
        with BuildLine():
            CenterArc((FILLET8_R, FILLET8_R), FILLET8_R, 180, 90)
            Line((0, FILLET8_R), (0, 0))
            Line((0, 0), (FILLET8_R, 0))
        make_face()
    extrude(amount=5.304705379, mode=Mode.SUBTRACT)

    # Fillet9
    fillet9_edges = [part.edges().sort_by_distance(p)[0] for p in [
        (-16.5, 10.875, 3.5),
        (-3.510826324, -25.5, 3.5),
        (14.449747468, -23.449747468, 3.5),
        (16.5, -6, 3.5),
        (5.325302234, 25.5, 3.5),
        (-14.449747468, 23.449747468, 3.5),
        (-17.489566077, -1.724884621, 3.5),
        (-20.442163848, -11.369276477, 3.5),
        (-17.716131688, -20.759968343, 3.5),
        (17.447155068, 11.371234859, 3.5),
        (20.150604469, 20.516326029, 3.5),
    ]]
    fillet(fillet9_edges, radius=FILLET9_R)


solid = part.part
